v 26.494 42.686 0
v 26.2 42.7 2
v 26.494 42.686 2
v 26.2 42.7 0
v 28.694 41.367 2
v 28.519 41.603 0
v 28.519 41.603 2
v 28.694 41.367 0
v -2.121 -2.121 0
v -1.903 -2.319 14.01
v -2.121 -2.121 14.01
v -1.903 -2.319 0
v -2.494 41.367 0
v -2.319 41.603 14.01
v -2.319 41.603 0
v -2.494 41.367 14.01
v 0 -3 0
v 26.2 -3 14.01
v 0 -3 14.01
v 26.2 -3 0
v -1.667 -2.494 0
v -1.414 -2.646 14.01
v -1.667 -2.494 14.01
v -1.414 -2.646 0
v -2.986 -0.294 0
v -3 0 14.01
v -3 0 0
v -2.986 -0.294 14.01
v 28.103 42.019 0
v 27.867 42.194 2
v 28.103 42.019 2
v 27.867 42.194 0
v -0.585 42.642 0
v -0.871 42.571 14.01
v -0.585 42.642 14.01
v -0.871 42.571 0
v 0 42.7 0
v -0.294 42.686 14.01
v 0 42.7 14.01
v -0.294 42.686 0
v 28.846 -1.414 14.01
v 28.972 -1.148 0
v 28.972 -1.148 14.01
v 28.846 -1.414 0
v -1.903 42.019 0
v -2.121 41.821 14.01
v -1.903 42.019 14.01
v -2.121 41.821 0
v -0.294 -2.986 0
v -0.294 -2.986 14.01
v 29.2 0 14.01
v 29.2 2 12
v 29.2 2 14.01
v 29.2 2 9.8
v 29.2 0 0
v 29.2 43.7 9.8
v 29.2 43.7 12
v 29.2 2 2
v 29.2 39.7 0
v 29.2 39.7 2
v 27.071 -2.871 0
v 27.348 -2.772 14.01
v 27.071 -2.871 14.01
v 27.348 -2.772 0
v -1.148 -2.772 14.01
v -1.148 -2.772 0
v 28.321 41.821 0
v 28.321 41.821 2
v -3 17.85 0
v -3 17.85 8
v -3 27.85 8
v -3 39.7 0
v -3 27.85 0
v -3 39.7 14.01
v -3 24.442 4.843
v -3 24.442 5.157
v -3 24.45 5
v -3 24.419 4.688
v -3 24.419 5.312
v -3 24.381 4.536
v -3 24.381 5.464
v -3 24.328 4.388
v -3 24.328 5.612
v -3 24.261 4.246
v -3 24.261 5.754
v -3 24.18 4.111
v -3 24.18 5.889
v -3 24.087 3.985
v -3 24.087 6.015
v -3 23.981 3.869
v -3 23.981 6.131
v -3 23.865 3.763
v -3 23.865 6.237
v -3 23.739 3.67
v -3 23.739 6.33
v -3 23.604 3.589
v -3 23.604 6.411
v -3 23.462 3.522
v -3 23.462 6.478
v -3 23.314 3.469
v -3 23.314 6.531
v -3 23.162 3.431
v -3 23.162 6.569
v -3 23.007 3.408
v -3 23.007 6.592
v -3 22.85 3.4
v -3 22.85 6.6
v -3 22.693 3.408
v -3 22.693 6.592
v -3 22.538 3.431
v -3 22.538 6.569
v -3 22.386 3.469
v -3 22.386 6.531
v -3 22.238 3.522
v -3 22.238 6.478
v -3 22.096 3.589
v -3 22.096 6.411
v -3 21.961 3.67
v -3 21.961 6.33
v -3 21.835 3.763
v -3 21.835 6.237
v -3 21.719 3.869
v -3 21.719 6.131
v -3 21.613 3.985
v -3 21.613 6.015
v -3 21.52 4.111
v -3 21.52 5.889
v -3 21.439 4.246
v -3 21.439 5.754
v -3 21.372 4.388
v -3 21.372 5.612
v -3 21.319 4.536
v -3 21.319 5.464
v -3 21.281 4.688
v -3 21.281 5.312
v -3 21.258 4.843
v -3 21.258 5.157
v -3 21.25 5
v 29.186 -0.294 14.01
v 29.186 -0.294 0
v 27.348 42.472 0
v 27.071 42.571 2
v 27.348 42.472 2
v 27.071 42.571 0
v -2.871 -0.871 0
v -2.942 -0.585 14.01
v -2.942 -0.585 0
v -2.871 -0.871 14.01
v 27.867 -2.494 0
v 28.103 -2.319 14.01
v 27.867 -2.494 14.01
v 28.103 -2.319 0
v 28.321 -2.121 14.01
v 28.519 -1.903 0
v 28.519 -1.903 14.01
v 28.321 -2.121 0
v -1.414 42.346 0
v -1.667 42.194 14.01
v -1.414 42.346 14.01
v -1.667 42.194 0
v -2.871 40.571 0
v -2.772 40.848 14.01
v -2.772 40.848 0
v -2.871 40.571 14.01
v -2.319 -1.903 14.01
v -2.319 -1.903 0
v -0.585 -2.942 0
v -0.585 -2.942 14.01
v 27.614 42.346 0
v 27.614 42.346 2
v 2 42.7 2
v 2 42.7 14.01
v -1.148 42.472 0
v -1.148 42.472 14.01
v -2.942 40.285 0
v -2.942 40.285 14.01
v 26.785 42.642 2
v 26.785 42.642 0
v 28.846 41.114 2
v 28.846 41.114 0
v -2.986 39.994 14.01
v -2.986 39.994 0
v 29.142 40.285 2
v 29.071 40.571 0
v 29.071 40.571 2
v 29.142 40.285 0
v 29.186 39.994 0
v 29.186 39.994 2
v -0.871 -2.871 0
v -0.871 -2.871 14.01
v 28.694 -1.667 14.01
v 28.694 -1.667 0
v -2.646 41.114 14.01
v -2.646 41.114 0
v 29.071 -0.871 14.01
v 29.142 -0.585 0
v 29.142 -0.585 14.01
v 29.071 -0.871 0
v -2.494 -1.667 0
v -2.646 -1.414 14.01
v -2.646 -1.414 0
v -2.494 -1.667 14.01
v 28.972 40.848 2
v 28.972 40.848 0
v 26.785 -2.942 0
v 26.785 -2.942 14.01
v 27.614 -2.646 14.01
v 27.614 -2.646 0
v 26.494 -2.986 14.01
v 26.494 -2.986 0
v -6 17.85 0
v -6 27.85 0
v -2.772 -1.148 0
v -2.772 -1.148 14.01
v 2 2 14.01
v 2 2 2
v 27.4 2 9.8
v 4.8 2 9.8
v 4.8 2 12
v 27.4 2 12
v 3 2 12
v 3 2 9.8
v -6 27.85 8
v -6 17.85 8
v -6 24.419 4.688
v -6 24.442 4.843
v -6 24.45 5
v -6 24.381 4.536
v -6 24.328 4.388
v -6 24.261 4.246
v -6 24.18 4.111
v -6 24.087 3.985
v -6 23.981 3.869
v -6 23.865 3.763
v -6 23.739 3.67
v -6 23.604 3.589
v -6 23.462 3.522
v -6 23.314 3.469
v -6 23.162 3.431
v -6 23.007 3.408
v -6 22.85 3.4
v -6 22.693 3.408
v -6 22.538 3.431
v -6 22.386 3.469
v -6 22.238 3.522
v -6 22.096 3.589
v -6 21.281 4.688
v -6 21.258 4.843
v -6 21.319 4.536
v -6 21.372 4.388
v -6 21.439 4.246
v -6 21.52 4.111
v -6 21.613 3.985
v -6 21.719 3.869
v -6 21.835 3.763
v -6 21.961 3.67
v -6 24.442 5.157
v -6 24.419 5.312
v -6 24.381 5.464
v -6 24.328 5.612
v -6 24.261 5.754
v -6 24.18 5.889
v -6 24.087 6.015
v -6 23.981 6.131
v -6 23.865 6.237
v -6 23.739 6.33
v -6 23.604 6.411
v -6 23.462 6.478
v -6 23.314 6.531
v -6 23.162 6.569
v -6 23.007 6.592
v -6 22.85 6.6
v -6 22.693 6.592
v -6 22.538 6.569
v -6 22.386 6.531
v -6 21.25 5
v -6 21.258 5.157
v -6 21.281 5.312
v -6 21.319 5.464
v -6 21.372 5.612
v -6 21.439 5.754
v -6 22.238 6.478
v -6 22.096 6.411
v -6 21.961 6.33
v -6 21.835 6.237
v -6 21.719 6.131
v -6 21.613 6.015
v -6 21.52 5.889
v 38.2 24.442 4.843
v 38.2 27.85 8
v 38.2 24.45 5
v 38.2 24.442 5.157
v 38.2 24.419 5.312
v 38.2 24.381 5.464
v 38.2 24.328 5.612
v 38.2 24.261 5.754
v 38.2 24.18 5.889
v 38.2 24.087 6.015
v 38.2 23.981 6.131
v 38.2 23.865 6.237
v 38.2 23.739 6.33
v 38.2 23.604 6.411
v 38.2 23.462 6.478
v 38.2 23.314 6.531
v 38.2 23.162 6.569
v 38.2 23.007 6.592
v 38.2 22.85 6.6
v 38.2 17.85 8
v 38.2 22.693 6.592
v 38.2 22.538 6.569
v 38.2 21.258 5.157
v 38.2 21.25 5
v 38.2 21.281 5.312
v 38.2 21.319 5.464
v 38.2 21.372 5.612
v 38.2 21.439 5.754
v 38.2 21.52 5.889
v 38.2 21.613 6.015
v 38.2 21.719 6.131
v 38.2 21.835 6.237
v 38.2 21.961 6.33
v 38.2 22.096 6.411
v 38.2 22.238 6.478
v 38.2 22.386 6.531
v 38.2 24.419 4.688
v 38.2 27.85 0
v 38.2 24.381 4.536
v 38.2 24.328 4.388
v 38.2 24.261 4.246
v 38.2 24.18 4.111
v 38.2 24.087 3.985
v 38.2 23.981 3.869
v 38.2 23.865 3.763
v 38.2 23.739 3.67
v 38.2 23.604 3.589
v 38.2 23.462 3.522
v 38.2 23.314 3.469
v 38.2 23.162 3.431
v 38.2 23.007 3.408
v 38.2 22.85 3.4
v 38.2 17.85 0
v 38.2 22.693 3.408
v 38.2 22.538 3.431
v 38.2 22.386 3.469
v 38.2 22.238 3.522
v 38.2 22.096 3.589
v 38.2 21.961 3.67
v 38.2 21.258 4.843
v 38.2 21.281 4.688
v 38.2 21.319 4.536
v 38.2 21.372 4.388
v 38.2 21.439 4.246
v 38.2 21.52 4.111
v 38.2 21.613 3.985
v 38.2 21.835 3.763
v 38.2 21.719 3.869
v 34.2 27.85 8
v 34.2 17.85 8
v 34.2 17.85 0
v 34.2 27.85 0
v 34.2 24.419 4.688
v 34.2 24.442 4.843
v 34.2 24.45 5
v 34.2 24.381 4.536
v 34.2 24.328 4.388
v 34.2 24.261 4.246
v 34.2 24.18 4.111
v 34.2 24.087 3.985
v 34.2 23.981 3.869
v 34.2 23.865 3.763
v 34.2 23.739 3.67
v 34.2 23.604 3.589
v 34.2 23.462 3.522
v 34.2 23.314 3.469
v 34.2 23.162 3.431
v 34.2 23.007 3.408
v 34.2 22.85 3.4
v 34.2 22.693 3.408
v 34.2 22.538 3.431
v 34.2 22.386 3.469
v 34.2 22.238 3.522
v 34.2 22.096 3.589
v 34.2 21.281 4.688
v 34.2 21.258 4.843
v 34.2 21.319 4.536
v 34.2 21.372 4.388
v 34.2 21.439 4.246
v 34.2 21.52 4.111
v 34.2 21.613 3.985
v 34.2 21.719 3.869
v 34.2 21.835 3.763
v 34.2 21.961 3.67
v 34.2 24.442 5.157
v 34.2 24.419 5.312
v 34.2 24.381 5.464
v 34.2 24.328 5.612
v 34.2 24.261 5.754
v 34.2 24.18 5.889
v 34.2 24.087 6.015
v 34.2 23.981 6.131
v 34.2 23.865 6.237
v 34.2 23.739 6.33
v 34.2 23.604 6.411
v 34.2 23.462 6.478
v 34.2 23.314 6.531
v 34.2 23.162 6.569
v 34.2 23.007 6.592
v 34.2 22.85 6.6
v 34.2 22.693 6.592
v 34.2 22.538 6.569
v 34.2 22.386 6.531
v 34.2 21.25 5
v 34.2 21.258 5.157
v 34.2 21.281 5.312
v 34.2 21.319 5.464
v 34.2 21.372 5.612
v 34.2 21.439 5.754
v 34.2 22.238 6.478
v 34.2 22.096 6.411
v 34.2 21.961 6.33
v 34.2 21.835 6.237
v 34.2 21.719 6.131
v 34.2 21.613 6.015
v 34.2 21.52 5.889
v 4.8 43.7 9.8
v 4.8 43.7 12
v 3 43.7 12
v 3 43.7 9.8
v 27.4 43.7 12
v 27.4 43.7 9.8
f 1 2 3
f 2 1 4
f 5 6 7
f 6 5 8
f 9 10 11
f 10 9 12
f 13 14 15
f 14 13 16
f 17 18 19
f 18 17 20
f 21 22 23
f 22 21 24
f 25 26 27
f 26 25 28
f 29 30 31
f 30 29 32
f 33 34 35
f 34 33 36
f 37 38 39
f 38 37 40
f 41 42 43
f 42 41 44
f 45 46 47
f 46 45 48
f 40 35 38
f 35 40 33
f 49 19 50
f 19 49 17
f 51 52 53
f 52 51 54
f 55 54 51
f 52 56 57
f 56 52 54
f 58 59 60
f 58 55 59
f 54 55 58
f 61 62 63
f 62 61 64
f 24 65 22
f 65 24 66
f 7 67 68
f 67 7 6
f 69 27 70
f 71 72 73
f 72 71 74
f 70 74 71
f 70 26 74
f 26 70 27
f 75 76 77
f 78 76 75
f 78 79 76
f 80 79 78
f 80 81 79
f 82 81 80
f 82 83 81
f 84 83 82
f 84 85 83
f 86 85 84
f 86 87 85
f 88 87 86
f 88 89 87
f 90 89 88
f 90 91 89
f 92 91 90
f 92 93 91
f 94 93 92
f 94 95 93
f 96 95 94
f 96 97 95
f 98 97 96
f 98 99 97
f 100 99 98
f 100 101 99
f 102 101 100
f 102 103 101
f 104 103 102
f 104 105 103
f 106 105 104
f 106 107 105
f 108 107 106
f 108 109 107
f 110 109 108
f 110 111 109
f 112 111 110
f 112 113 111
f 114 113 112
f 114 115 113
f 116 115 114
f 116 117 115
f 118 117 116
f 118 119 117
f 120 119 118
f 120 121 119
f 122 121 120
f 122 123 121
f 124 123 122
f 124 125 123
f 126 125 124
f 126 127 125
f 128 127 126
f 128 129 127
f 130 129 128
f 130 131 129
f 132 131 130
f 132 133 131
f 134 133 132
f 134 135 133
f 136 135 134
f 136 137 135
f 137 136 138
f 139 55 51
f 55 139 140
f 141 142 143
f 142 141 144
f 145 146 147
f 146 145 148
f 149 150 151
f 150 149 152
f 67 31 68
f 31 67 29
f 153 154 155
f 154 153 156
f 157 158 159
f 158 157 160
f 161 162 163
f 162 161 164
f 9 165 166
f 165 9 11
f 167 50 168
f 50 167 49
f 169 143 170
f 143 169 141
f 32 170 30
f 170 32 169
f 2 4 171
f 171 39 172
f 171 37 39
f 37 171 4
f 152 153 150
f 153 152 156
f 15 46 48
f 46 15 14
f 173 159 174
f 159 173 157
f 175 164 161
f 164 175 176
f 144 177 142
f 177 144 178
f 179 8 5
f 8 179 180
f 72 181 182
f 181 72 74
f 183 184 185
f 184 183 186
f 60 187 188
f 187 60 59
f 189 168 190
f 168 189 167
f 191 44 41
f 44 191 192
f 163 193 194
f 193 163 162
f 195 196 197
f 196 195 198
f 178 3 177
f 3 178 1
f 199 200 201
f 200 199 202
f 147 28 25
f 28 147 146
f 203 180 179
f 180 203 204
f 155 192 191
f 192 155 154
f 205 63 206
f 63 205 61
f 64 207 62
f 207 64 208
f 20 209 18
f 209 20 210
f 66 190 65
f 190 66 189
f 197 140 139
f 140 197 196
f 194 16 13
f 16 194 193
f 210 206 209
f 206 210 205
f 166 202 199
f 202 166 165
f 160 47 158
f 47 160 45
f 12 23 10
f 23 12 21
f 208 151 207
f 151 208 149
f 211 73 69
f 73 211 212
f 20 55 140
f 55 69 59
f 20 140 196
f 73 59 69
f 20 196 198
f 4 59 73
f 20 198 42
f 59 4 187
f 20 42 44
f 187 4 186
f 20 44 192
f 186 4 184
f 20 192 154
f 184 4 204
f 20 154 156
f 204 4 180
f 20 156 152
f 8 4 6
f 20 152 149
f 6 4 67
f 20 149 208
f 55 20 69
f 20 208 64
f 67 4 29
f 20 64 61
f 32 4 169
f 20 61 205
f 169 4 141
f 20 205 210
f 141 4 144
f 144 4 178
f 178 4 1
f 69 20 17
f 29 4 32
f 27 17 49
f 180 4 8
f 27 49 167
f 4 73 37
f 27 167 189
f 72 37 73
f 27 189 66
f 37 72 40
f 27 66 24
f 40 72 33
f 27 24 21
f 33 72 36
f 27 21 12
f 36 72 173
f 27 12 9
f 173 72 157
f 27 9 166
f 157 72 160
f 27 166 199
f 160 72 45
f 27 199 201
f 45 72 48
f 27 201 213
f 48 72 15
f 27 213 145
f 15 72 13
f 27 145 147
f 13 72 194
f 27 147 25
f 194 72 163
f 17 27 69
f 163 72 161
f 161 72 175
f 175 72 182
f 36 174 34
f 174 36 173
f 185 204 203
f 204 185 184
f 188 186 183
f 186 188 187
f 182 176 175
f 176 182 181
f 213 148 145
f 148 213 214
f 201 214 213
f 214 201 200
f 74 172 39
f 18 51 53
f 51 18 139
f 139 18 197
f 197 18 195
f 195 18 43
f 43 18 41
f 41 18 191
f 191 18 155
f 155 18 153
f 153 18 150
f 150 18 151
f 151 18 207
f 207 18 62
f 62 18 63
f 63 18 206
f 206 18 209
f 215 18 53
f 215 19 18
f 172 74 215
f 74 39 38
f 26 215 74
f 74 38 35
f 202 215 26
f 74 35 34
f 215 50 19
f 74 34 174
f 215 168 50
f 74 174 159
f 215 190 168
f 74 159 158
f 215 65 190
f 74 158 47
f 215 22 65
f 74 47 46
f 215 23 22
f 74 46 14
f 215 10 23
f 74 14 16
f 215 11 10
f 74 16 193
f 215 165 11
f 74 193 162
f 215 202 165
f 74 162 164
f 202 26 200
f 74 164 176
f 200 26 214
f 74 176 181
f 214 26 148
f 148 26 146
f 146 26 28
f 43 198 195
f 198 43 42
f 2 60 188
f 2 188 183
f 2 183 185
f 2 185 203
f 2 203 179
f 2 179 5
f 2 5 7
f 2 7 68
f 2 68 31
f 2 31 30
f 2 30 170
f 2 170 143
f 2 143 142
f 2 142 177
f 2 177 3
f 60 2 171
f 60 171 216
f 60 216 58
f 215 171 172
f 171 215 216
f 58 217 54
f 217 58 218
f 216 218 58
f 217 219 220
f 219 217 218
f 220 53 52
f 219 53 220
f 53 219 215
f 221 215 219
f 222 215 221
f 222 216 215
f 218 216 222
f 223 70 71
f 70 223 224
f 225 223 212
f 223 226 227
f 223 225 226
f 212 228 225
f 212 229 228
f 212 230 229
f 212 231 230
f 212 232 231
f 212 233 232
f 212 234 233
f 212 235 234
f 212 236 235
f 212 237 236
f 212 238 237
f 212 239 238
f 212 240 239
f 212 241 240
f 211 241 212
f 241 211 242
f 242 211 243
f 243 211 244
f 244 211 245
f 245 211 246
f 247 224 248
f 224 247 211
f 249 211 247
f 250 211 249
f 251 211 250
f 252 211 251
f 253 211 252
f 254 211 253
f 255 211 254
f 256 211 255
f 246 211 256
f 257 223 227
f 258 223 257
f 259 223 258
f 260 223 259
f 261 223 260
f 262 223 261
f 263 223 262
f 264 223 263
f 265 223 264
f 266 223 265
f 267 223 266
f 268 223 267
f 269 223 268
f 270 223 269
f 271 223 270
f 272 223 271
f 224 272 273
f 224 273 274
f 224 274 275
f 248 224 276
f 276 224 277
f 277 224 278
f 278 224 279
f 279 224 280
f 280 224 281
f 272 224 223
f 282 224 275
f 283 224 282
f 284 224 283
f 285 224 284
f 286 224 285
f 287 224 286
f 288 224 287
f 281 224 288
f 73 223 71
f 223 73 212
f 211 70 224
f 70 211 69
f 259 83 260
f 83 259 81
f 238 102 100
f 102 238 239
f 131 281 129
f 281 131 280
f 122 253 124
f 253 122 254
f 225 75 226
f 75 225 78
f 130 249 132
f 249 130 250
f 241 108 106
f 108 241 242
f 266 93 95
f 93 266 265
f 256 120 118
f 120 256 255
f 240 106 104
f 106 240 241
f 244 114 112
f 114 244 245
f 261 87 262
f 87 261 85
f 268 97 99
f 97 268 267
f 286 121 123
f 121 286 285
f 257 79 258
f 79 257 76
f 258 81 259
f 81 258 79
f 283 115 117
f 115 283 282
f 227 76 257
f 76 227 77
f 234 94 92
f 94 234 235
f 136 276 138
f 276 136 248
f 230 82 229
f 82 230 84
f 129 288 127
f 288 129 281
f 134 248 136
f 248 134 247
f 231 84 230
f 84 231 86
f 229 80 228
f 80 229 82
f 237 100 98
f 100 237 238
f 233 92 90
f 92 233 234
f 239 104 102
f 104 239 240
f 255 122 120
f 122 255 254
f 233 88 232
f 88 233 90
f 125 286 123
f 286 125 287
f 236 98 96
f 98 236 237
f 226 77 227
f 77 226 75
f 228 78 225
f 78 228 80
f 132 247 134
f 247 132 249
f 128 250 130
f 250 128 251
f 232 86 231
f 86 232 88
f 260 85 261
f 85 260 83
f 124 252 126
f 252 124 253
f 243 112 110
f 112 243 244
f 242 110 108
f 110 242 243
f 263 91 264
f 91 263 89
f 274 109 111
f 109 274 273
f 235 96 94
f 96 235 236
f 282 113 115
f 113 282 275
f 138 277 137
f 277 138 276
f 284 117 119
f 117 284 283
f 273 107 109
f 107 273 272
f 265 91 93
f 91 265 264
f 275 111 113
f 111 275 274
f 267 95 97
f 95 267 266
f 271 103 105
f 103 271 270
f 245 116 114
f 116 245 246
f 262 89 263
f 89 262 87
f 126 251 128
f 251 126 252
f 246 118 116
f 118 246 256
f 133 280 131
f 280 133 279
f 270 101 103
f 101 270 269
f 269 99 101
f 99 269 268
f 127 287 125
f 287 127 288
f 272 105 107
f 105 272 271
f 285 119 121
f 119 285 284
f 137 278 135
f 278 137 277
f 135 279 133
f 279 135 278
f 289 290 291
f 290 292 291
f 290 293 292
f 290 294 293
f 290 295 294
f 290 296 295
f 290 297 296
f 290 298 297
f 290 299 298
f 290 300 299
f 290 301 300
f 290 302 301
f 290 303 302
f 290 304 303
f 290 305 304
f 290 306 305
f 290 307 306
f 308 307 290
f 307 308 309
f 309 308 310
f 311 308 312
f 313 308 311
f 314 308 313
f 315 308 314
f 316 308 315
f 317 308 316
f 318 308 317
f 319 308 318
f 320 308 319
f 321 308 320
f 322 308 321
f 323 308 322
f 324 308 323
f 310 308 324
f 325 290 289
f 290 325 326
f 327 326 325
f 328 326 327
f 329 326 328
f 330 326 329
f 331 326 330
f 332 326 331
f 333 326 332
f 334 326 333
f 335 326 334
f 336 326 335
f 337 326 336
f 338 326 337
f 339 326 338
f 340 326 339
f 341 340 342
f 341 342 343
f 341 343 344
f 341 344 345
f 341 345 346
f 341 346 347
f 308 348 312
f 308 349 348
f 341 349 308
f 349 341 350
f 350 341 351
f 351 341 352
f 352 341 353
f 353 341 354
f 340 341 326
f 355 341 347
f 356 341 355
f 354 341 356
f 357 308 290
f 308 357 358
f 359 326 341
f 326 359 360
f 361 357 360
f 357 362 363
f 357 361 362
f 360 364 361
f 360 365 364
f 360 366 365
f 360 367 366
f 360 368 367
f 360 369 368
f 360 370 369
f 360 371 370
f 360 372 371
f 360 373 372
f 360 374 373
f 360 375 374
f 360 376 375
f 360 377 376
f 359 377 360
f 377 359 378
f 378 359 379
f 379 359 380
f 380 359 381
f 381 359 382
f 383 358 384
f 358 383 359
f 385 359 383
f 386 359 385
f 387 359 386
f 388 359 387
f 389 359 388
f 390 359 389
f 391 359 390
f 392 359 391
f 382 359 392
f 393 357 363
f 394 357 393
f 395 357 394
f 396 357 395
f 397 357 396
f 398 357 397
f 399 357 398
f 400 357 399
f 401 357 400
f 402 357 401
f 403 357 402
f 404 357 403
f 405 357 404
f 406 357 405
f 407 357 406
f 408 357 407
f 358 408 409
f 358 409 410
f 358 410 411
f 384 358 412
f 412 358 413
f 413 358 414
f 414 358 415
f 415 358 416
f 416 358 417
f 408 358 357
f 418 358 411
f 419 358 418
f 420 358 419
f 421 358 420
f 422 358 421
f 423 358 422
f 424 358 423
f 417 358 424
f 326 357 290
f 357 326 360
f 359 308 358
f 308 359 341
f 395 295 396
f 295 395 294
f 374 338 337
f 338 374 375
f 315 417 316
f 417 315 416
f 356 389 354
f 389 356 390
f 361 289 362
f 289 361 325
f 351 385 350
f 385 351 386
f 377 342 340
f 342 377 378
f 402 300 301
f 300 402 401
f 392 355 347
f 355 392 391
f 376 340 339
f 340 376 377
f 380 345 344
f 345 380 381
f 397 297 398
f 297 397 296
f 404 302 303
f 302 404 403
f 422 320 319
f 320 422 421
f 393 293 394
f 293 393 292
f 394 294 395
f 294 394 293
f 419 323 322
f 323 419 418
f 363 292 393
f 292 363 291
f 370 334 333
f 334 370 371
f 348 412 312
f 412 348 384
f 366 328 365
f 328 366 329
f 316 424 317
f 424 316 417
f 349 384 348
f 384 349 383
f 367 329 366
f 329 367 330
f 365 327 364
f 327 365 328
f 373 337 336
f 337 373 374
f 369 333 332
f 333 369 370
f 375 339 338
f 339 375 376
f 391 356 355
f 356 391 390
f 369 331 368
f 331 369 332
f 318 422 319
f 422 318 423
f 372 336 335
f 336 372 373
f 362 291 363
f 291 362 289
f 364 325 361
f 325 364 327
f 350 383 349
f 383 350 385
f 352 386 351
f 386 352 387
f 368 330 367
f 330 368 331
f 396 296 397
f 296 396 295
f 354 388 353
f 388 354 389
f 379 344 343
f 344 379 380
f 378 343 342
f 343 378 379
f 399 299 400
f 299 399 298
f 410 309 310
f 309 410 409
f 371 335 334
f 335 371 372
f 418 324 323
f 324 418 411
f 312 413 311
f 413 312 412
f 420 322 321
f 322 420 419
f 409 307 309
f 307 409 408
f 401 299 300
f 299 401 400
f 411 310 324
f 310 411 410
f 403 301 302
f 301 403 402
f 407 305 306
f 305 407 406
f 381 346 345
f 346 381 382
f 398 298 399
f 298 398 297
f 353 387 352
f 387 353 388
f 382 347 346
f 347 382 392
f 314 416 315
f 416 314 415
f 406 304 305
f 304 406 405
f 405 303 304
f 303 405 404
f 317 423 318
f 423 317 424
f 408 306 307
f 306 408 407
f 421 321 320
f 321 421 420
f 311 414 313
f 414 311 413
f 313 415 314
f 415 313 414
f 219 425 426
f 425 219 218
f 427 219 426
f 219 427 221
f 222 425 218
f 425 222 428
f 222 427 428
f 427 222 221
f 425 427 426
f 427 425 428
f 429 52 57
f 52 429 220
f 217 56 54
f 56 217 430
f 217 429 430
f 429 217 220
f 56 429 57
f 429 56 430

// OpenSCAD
// esp32cam_case_slider.scad
// Parametric ESP32-CAM case with sliding lens cover + mounting ears
// Designed as an original model (not a copy of any specific seller part).

$fn = 64;

// ---------- Parameters (EDIT THESE) ----------
board_w = 27.0;        // ESP32-CAM PCB width (mm)
board_l = 40.5;        // PCB length (mm)
board_t = 1.6;         // PCB thickness (mm)

clear_xy = 0.6;        // clearance around board (mm) (increase if too tight)
clear_z  = 1.0;        // clearance above board components (mm)

wall = 2.0;            // case wall thickness (mm)
base_floor = 2.0;      // bottom thickness (mm)

inner_h = 12.0;        // internal height from floor to inside top (mm)
                      // ensure this clears your tallest component

lens_window_w = 14.0;  // window width (mm)
lens_window_h = 14.0;  // window height (mm)
lens_window_offset_x = 0.0; // shift window left/right (mm)
lens_window_offset_y = 9.0; // shift window toward "front" (mm)

rail_h = 2.2;          // slider rail height (mm)
rail_w = 1.8;          // slider rail thickness (mm)
rail_gap = 0.3;        // clearance between rail and slider (mm)

slider_t = 1.6;        // slider plate thickness (mm)
slider_grip = 6.0;     // grip tab length (mm)

ear_w = 10.0;          // mounting ear width (mm)
ear_t = 4.0;           // mounting ear thickness (mm)
ear_hole_d = 3.2;      // M3 clearance
ear_offset = 6.0;      // ear offset from case side (mm)

corner_r = 3.0;        // rounding radius (cosmetic)

// ---------- Derived ----------
inner_w = board_w + 2*clear_xy;
inner_l = board_l + 2*clear_xy;
outer_w = inner_w + 2*wall;
outer_l = inner_l + 2*wall;
outer_h = base_floor + inner_h;

module rounded_box(w,l,h,r){
  // Minkowski rounding (simple + nice)
  minkowski(){
    cube([w-2*r, l-2*r, h], center=false);
    cylinder(r=r, h=0.01);
  }
}

module case_body(){
  difference(){
    // outer shell
    rounded_box(outer_w, outer_l, outer_h, corner_r);

    // hollow interior
    translate([wall, wall, base_floor])
      cube([inner_w, inner_l, inner_h+0.1], center=false);

    // front lens window cut (through the "lid area")
    // Window positioned on the "top face" area, but we cut through the front wall area
    // by cutting a vertical slot through the top thickness region.
    translate([
      outer_w/2 - lens_window_w/2 + lens_window_offset_x,
      wall + lens_window_offset_y,
      outer_h - (wall + 0.1)
    ])
      cube([lens_window_w, lens_window_h, wall+0.2], center=false);

    // Simple cable/connector notch at the back (tweak as needed)
    notch_w = 12;
    notch_h = 6;
    translate([outer_w/2 - notch_w/2, outer_l - wall - 0.1, base_floor+2])
      cube([notch_w, wall+0.2, notch_h], center=false);
  }

  // Rails for slider (two rails on the top face, left/right)
  // Rails run along Y direction near the top
  rail_z = outer_h - wall - rail_h;

  // left rail
  translate([wall + 1.0, wall, rail_z])
    cube([rail_w, outer_l - 2*wall, rail_h], center=false);

  // right rail
  translate([outer_w - wall - 1.0 - rail_w, wall, rail_z])
    cube([rail_w, outer_l - 2*wall, rail_h], center=false);

  // Mounting ears (left/right mid)
  translate([-ear_offset, outer_l/2 - ear_w/2, 0])
    mounting_ear();

  translate([outer_w + ear_offset - ear_t, outer_l/2 - ear_w/2, 0])
    mounting_ear();
}

module mounting_ear(){
  difference(){
    cube([ear_t, ear_w, base_floor + inner_h/2], center=false);
    translate([ear_t/2, ear_w/2, (base_floor + inner_h/4)])
      rotate([0,90,0])
        cylinder(d=ear_hole_d, h=ear_t+0.5, center=true);
  }
}

module slider(){
  // Slider plate sits over the top, captured by rails
  plate_w = outer_w - 2*(wall + 1.0) - 2*rail_w - 2*rail_gap;
  plate_l = outer_l - 2*wall;

  // Plate thickness: slider_t
  // Add a "shutter" region that covers the lens window when slid forward
  union(){
    // main plate
    translate([wall + 1.0 + rail_w + rail_gap, wall, outer_h - wall - slider_t])
      cube([plate_w, plate_l, slider_t], center=false);

    // grip tab at the back
    translate([outer_w/2 - 10/2, outer_l - wall + 0.1, outer_h - wall - slider_t])
      cube([10, slider_grip, slider_t], center=false);

    // stopper nib (front) to reduce slipping out
    translate([outer_w/2 - 6/2, wall - 1.2, outer_h - wall - slider_t])
      cube([6, 1.2, slider_t], center=false);
  }
}

// ---------- Build ----------
case_body();
// For printing the slider separately, comment the line above and uncomment below:
// slider();
